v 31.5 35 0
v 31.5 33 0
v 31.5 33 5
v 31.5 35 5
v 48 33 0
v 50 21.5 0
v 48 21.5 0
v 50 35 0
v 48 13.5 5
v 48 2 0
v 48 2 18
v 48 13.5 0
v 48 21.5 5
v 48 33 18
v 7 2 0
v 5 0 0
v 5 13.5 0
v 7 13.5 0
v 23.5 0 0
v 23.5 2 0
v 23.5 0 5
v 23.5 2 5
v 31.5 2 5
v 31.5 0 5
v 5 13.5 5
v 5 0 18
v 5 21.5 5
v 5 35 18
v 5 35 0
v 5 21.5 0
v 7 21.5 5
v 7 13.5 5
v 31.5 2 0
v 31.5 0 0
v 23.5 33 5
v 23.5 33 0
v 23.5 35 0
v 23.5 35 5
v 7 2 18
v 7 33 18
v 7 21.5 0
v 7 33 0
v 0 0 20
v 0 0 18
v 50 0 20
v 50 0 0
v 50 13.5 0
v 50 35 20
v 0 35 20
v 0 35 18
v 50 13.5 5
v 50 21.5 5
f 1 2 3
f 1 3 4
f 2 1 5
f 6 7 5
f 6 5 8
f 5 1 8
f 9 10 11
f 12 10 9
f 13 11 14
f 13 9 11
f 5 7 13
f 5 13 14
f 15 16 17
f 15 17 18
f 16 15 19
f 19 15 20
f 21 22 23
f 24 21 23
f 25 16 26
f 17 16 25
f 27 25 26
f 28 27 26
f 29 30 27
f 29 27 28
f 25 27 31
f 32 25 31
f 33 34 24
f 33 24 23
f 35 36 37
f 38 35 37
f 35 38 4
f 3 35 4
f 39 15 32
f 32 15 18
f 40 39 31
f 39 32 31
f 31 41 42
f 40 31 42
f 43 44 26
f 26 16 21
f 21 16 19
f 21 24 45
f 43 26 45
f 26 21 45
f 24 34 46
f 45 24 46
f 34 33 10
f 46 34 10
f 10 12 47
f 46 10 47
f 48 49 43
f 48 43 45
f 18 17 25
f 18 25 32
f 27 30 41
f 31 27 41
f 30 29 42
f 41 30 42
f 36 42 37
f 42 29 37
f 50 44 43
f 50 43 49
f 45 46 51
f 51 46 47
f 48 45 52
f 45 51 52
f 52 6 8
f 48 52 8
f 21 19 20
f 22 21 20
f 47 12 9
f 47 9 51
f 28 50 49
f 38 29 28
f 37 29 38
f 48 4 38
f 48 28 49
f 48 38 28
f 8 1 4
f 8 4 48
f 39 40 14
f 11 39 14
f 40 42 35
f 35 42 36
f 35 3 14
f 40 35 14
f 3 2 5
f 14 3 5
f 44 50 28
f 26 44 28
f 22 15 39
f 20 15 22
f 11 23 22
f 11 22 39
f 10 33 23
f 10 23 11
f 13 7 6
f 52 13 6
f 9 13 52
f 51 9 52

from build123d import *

# Parameters (mm, degrees)
BOX006_W     = 2
BOX006_H     = 8
BOX006_DEPTH = 5
BOX005_W     = 2
BOX005_H     = 8
BOX005_DEPTH = 5
BOX004_W     = 8
BOX004_H     = 2
BOX004_DEPTH = 5
BOX003_W     = 8
BOX003_H     = 2
BOX003_DEPTH = 5
BOX002_W     = 41
BOX002_H     = 31
BOX002_DEPTH = 18
BOX001_W     = 5
BOX001_H     = 35
BOX001_DEPTH = 18
BOX_W        = 50
BOX_H        = 35
BOX_DEPTH    = 20


with BuildPart() as cubo006:
    # Box006 → Box006 (new body)
    with BuildSketch(Plane(origin=(48, 13.5, 0), x_dir=(1, 0, 0), z_dir=(0, 0, 1))):
        with Locations((1, 4)):
            Rectangle(BOX006_W, BOX006_H)
    extrude(amount=BOX006_DEPTH)


with BuildPart() as cubo005:
    # Box005 → Box005 (new body)
    with BuildSketch(Plane(origin=(5, 13.5, 0), x_dir=(1, 0, 0), z_dir=(0, 0, 1))):
        with Locations((1, 4)):
            Rectangle(BOX005_W, BOX005_H)
    extrude(amount=BOX005_DEPTH)


with BuildPart() as cubo004:
    # Box004 → Box004 (new body)
    with BuildSketch(Plane(origin=(23.5, 33, 0), x_dir=(1, 0, 0), z_dir=(0, 0, 1))):
        with Locations((4, 1)):
            Rectangle(BOX004_W, BOX004_H)
    extrude(amount=BOX004_DEPTH)


with BuildPart() as cubo003:
    # Box003 → Box003 (new body)
    with BuildSketch(Plane(origin=(23.5, 0, 0), x_dir=(1, 0, 0), z_dir=(0, 0, 1))):
        with Locations((4, 1)):
            Rectangle(BOX003_W, BOX003_H)
    extrude(amount=BOX003_DEPTH)


with BuildPart() as cubo002:
    # Box002 → Box002 (new body)
    with BuildSketch(Plane(origin=(7, 2, 0), x_dir=(1, 0, 0), z_dir=(0, 0, 1))):
        with Locations((20.5, 15.5)):
            Rectangle(BOX002_W, BOX002_H)
    extrude(amount=BOX002_DEPTH)


with BuildPart() as cubo001:
    # Box001 → Box001 (new body)
    with BuildSketch(Plane.XY):
        with Locations((2.5, 17.5)):
            Rectangle(BOX001_W, BOX001_H)
    extrude(amount=BOX001_DEPTH)


with BuildPart() as cut005:
    # Box → Box (new body)
    with BuildSketch(Plane.XY):
        with Locations((25, 17.5)):
            Rectangle(BOX_W, BOX_H)
    extrude(amount=BOX_DEPTH)

    # Cut: cut Cubo001
    add(cubo001.part, mode=Mode.SUBTRACT)

    # Cut001: cut Cubo002
    add(cubo002.part, mode=Mode.SUBTRACT)

    # Cut002: cut Cubo003
    add(cubo003.part, mode=Mode.SUBTRACT)

    # Cut003: cut Cubo004
    add(cubo004.part, mode=Mode.SUBTRACT)

    # Cut004: cut Cubo005
    add(cubo005.part, mode=Mode.SUBTRACT)

    # Cut005: cut Cubo006
    add(cubo006.part, mode=Mode.SUBTRACT)


solid = cut005.part
